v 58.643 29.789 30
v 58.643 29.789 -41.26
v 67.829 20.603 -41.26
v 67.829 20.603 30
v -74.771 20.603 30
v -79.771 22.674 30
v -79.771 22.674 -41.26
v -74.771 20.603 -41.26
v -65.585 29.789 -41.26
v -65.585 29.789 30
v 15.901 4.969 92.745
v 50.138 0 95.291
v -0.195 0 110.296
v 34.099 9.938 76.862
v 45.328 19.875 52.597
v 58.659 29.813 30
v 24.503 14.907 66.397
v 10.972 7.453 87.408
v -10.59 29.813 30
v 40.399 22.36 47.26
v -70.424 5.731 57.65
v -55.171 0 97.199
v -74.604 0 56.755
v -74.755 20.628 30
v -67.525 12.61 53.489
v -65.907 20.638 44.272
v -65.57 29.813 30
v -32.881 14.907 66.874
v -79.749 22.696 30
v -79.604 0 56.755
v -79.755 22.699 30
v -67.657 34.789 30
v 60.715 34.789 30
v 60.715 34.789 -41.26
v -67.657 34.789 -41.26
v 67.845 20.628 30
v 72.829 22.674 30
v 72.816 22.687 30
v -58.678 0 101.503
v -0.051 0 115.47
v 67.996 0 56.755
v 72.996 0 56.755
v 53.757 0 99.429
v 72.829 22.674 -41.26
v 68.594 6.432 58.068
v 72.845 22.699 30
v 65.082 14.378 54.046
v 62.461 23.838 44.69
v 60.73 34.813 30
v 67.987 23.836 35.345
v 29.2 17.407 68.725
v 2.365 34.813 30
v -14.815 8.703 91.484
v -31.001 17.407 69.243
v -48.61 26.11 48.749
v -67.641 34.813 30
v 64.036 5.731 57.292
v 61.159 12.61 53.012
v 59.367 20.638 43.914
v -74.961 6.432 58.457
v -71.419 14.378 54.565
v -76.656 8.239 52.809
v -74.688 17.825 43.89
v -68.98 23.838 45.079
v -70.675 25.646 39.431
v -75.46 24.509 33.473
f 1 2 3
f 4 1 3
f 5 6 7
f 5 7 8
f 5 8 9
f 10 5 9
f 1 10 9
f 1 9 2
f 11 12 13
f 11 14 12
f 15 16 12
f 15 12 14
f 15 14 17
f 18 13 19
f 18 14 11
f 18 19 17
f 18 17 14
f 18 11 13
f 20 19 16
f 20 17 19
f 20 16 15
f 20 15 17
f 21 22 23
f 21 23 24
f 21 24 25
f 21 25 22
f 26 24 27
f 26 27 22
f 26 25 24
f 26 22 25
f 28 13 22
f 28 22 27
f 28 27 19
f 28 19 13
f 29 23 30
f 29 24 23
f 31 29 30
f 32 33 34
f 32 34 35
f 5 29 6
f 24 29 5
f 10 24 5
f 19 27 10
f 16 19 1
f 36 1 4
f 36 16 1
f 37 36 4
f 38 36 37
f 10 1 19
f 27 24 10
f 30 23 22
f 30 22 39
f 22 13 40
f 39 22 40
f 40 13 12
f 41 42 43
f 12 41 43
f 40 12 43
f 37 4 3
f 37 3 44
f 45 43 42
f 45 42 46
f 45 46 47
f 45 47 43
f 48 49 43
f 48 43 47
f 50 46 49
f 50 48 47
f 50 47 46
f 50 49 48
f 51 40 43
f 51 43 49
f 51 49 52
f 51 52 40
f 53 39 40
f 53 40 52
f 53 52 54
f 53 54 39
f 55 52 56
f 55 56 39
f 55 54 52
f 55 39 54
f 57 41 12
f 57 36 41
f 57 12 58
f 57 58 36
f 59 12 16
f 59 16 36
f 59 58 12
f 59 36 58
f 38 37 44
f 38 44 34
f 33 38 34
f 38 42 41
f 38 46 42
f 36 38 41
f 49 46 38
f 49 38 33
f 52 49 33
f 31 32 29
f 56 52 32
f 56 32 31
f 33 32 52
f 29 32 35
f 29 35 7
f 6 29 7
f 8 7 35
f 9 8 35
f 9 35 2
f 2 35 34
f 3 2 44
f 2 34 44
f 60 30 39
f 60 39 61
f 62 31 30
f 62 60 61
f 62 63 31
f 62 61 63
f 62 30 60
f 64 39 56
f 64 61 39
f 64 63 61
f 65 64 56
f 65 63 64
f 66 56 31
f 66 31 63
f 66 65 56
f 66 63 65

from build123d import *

# Parameters (mm, degrees)
BOSS_EXTRUDE1_DEPTH = 71.26


with BuildPart() as part:
    # Loft13: read off the stored shape, not the designer's step
    # Loft13: loft between two sections, ruled curve by curve
    loft13_from = [
        Edge.make_bspline([(-79.603627765, 0, 56.755489551), (-76.115966153, 0, 64.213426555), (-72.628304542, 0, 71.67136356), (-65.652981318, 0, 86.587237568), (-62.165319707, 0, 94.045174572), (-58.677658095, 0, 101.503111577)], [0, 0, 0, 0, 0.5, 0.5, 1, 1, 1, 1], 3),
        Edge.make_bspline([(-58.677658095, 0, 101.503111577), (-48.906538694, 0, 103.830924441), (-39.135419292, 0, 106.158737306), (-19.59318049, 0, 110.814363034), (-9.822061088, 0, 113.142175899), (-0.050941687, 0, 115.469988763)], [0, 0, 0, 0, 0.5, 0.5, 1, 1, 1, 1], 3),
        Edge.make_bspline([(-74.603627765, 0, 56.755489551), (-75.436961098, 0, 56.755489551), (-76.270294432, 0, 56.755489551), (-77.936961098, 0, 56.755489551), (-78.770294432, 0, 56.755489551), (-79.603627765, 0, 56.755489551)], [0, 0, 0, 0, 0.5, 0.5, 1, 1, 1, 1], 3),
        Edge.make_bspline([(-0.050941687, 0, 115.469988763), (8.91697935, 0, 112.796539052), (17.884900386, 0, 110.12308934), (35.820742459, 0, 104.776189918), (44.788663496, 0, 102.102740206), (53.756584532, 0, 99.429290495)], [0, 0, 0, 0, 0.5, 0.5, 1, 1, 1, 1], 3),
        Edge.make_bspline([(53.756584532, 0, 99.429290495), (56.963215816, 0, 92.316990338), (60.1698471, 0, 85.20469018), (66.583109668, 0, 70.980089866), (69.789740951, 0, 63.867789708), (72.996372235, 0, 56.755489551)], [0, 0, 0, 0, 0.5, 0.5, 1, 1, 1, 1], 3),
        Edge.make_bspline([(72.996372235, 0, 56.755489551), (72.163038902, 0, 56.755489551), (71.329705568, 0, 56.755489551), (69.663038902, 0, 56.755489551), (68.829705568, 0, 56.755489551), (67.996372235, 0, 56.755489551)], [0, 0, 0, 0, 0.5, 0.5, 1, 1, 1, 1], 3),
        Edge.make_bspline([(67.996372235, 0, 56.755489551), (65.019950017, 0, 63.178013733), (62.043527798, 0, 69.600537914), (56.090683362, 0, 82.445586278), (53.114261143, 0, 88.86811046), (50.137838925, 0, 95.290634641)], [0, 0, 0, 0, 0.5, 0.5, 1, 1, 1, 1], 3),
        Edge.make_bspline([(50.137838925, 0, 95.290634641), (41.74895364, 0, 97.791466534), (33.360068355, 0, 100.292298427), (16.582297786, 0, 105.293962214), (8.193412501, 0, 107.794794107), (-0.195472784, 0, 110.295626)], [0, 0, 0, 0, 0.5, 0.5, 1, 1, 1, 1], 3),
        Edge.make_bspline([(-0.195472784, 0, 110.295626), (-9.358047044, 0, 108.112789279), (-18.520621304, 0, 105.929952558), (-36.845769825, 0, 101.564279116), (-46.008344086, 0, 99.381442395), (-55.170918346, 0, 97.198605674)], [0, 0, 0, 0, 0.5, 0.5, 1, 1, 1, 1], 3),
        Edge.make_bspline([(-55.170918346, 0, 97.198605674), (-58.409703249, 0, 90.45808632), (-61.648488152, 0, 83.717566966), (-68.126057959, 0, 70.236528259), (-71.364842862, 0, 63.496008905), (-74.603627765, 0, 56.755489551)], [0, 0, 0, 0, 0.5, 0.5, 1, 1, 1, 1], 3),
    ]
    loft13_to = [
        Edge.make_bspline([(-79.755478337, 22.698681281, 30), (-77.736400655, 24.717758964, 30), (-75.717322973, 26.736836646, 30), (-71.679167608, 30.774992011, 30), (-69.660089926, 32.794069693, 30), (-67.641012243, 34.813147375, 30)], [0, 0, 0, 0, 0.5, 0.5, 1, 1, 1, 1], 3),
        Edge.make_bspline([(-67.641012243, 34.813147375, 30), (-55.973275602, 34.813147375, 30), (-44.305538961, 34.813147375, 30), (-20.97006568, 34.813147375, 30), (-9.302329039, 34.813147375, 30), (2.365407602, 34.813147375, 30)], [0, 0, 0, 0, 0.5, 0.5, 1, 1, 1, 1], 3),
        Edge.make_bspline([(-74.755478337, 20.62761347, 30), (-75.588811671, 20.972791438, 30), (-76.422145004, 21.317969407, 30), (-78.088811671, 22.008325344, 30), (-78.922145004, 22.353503313, 30), (-79.755478337, 22.698681281, 30)], [0, 0, 0, 0, 0.5, 0.5, 1, 1, 1, 1], 3),
        Edge.make_bspline([(2.365407602, 34.813147375, 30), (12.09284893, 34.813147375, 30), (21.820290258, 34.813147375, 30), (41.275172913, 34.813147375, 30), (51.002614241, 34.813147375, 30), (60.730055569, 34.813147375, 30)], [0, 0, 0, 0, 0.5, 0.5, 1, 1, 1, 1], 3),
        Edge.make_bspline([(60.730055569, 34.813147375, 30), (62.749133251, 32.794069693, 30), (64.768210933, 30.774992011, 30), (68.806366298, 26.736836646, 30), (70.82544398, 24.717758964, 30), (72.844521663, 22.698681281, 30)], [0, 0, 0, 0, 0.5, 0.5, 1, 1, 1, 1], 3),
        Edge.make_bspline([(72.844521663, 22.698681281, 30), (72.011188329, 22.353503313, 30), (71.177854996, 22.008325344, 30), (69.511188329, 21.317969407, 30), (68.677854996, 20.972791438, 30), (67.844521663, 20.62761347, 30)], [0, 0, 0, 0, 0.5, 0.5, 1, 1, 1, 1], 3),
        Edge.make_bspline([(67.844521663, 20.62761347, 30), (66.313599345, 22.158535787, 30), (64.782677027, 23.689458105, 30), (61.720832392, 26.75130274, 30), (60.189910074, 28.282225058, 30), (58.658987757, 29.813147375, 30)], [0, 0, 0, 0, 0.5, 0.5, 1, 1, 1, 1], 3),
        Edge.make_bspline([(58.658987757, 29.813147375, 30), (47.117545897, 29.813147375, 30), (35.576104037, 29.813147375, 30), (12.493220317, 29.813147375, 30), (0.951778457, 29.813147375, 30), (-10.589663403, 29.813147375, 30)], [0, 0, 0, 0, 0.5, 0.5, 1, 1, 1, 1], 3),
        Edge.make_bspline([(-10.589663403, 29.813147375, 30), (-19.753043574, 29.813147375, 30), (-28.916423746, 29.813147375, 30), (-47.243184088, 29.813147375, 30), (-56.40656426, 29.813147375, 30), (-65.569944431, 29.813147375, 30)], [0, 0, 0, 0, 0.5, 0.5, 1, 1, 1, 1], 3),
        Edge.make_bspline([(-65.569944431, 29.813147375, 30), (-67.100866749, 28.282225058, 30), (-68.631789067, 26.75130274, 30), (-71.693633702, 23.689458105, 30), (-73.22455602, 22.158535787, 30), (-74.755478337, 20.62761347, 30)], [0, 0, 0, 0, 0.5, 0.5, 1, 1, 1, 1], 3),
    ]
    loft13 = Solid(Shell([*[Face.make_surface_from_curves(loft13_from[k], loft13_to[k]) for k in range(10)], Face(Wire(loft13_from)), Face(Wire(loft13_to))]))
    add(loft13)

    # Sketch9 → Boss-Extrude1 (add)
    with BuildSketch(Plane.XY.offset(30)):
        Polygon((-79.770999887, 22.67425966), (-74.770999887, 20.603191848), (-65.585465981, 29.788725754), (58.643466207, 29.788725754), (67.829000113, 20.603191848), (72.829000113, 22.67425966), (60.714534019, 34.788725754), (-67.656533793, 34.788725754), align=None)
    extrude(amount=-BOSS_EXTRUDE1_DEPTH)


solid = part.part
